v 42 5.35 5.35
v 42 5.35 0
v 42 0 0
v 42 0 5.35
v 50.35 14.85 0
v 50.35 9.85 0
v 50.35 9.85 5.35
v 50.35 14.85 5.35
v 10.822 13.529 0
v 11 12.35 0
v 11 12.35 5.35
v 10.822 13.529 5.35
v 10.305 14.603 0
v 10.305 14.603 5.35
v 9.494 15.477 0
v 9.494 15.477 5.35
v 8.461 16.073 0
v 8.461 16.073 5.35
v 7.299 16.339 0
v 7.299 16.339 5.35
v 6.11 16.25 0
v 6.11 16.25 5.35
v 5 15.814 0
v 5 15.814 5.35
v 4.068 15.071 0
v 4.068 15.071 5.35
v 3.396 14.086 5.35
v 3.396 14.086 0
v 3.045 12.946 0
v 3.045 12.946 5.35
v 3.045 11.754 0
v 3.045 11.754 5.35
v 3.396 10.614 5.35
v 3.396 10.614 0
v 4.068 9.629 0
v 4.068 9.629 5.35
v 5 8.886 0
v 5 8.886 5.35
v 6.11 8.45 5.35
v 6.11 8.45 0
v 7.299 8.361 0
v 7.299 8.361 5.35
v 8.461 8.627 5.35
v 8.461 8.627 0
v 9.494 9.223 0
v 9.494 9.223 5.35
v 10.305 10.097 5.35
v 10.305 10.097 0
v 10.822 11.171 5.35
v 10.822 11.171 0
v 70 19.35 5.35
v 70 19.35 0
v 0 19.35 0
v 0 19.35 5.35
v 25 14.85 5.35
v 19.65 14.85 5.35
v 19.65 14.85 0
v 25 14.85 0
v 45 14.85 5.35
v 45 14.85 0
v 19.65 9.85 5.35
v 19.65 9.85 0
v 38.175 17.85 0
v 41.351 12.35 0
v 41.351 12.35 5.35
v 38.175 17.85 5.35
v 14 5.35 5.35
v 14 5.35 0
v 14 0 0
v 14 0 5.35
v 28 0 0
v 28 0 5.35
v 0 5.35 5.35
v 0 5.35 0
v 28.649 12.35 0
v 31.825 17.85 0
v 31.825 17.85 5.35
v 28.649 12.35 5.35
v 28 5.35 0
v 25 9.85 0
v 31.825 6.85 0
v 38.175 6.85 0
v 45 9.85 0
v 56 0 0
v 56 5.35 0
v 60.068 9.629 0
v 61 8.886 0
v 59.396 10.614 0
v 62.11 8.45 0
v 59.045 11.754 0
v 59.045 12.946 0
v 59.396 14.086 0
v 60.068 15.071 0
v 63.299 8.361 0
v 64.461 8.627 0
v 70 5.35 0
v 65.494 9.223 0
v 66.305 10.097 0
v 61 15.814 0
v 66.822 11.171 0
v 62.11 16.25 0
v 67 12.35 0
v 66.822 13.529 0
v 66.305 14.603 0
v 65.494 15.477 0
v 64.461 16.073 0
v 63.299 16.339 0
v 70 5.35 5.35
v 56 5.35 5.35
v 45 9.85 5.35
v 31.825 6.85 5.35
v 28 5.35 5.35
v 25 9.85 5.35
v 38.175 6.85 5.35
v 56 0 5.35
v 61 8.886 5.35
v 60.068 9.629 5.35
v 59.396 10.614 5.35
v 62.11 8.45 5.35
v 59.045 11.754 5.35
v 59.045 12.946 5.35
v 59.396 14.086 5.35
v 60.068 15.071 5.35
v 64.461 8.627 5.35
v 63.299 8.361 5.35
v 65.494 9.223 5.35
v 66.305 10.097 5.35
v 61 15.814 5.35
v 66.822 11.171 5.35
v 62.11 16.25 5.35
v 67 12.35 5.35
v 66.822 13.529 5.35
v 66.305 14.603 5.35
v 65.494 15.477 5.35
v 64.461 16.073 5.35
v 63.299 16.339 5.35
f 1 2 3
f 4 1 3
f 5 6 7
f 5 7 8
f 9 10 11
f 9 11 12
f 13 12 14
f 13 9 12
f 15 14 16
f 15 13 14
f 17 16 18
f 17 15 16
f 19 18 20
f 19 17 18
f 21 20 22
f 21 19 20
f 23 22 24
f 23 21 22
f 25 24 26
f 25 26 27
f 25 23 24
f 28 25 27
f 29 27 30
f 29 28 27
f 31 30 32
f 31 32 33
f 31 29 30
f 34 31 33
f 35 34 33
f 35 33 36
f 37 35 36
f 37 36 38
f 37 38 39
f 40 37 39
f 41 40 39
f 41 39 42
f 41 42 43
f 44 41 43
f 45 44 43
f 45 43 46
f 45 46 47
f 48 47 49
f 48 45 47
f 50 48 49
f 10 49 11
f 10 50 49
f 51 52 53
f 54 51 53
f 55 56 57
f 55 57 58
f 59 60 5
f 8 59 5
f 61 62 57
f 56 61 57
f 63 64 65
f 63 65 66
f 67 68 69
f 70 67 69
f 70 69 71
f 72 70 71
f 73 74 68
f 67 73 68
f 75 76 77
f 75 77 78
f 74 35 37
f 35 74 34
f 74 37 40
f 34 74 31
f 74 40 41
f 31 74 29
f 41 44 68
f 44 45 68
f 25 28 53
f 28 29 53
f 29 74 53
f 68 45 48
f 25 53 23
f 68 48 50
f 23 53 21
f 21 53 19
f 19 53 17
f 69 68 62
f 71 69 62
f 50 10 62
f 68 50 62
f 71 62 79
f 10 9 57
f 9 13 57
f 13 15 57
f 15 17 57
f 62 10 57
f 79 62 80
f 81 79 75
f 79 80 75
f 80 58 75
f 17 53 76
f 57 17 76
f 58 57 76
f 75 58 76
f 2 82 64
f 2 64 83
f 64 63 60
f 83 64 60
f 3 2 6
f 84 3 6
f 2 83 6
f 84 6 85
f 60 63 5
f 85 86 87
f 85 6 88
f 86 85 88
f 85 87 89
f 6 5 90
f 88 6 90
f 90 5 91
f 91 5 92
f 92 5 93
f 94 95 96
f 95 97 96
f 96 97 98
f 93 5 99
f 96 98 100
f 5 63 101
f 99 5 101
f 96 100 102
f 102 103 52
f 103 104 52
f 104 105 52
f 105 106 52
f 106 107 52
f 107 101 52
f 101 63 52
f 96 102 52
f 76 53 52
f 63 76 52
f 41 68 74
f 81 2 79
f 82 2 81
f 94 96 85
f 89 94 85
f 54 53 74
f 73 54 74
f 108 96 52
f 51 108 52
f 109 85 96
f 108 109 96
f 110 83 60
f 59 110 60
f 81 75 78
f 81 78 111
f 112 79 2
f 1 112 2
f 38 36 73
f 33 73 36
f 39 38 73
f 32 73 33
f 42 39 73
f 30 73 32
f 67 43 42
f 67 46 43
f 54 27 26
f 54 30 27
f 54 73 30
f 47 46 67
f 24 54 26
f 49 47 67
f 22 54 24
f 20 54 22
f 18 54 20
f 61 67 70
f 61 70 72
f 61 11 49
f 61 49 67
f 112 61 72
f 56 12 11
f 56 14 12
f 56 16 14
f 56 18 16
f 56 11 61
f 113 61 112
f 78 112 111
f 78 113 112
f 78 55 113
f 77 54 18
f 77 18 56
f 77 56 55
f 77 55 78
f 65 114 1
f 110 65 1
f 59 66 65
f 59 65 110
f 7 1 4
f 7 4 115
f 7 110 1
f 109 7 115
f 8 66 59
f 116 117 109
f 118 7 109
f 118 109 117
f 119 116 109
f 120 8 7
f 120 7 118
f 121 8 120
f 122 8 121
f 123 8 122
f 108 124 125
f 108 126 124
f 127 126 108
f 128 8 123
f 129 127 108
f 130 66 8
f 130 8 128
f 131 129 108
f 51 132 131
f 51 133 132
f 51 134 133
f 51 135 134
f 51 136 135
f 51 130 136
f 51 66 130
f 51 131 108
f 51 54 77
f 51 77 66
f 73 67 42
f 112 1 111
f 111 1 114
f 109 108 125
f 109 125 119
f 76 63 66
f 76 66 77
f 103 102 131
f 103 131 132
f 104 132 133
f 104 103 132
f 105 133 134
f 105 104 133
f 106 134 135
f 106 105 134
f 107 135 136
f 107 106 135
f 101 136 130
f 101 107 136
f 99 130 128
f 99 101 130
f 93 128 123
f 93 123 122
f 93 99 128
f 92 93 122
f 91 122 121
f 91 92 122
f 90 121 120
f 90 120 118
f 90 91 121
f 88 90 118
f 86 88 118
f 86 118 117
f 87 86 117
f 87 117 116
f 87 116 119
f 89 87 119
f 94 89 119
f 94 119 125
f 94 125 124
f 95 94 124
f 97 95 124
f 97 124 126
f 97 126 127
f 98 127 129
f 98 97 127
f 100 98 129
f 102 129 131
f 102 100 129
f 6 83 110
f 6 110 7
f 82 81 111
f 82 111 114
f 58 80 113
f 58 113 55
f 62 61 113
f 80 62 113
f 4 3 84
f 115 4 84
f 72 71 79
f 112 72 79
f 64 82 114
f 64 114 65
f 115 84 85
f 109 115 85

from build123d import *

# Parameters (mm, degrees)
MODEL_R             = 4
MODEL_W             = 5.350001156
MODEL_H             = 4.999999889
MODEL_W_2           = 5.349997431
BOSS_EXTRUDE1_DEPTH = 5.35


with BuildPart() as part:
    # Model → Boss-Extrude1 (new body)
    with BuildSketch(Plane.XY):
        Polygon((70.000000298, 5.350000225), (70.000000298, 19.350000657), (0, 19.350000657), (0, 5.350000225), (13.99999857, 5.350000225), (13.99999857, 0), (28.000000864, 0), (28.000000864, 5.350000225), (41.999999434, 5.350000225), (41.999999434, 0), (55.999999866, 0), (55.999999866, 5.350000225), align=None)
        with Locations((7.000000298, 12.350000225)):
            Circle(MODEL_R, mode=Mode.SUBTRACT)
        with Locations((63.000000298, 12.350000225)):
            Circle(MODEL_R, mode=Mode.SUBTRACT)
        with Locations((47.675000504, 12.349999976)):
            Rectangle(MODEL_W, MODEL_H, mode=Mode.SUBTRACT)
        with Locations((22.324999795, 12.349999976)):
            Rectangle(MODEL_W_2, MODEL_H, mode=Mode.SUBTRACT)
        Polygon((41.350852698, 12.350000441), (38.175426424, 17.850000411), (31.824573874, 17.850000411), (28.6491476, 12.350000441), (31.824573874, 6.850000238), (38.175426424, 6.850000238), align=None, mode=Mode.SUBTRACT)
    extrude(amount=BOSS_EXTRUDE1_DEPTH)


solid = part.part
